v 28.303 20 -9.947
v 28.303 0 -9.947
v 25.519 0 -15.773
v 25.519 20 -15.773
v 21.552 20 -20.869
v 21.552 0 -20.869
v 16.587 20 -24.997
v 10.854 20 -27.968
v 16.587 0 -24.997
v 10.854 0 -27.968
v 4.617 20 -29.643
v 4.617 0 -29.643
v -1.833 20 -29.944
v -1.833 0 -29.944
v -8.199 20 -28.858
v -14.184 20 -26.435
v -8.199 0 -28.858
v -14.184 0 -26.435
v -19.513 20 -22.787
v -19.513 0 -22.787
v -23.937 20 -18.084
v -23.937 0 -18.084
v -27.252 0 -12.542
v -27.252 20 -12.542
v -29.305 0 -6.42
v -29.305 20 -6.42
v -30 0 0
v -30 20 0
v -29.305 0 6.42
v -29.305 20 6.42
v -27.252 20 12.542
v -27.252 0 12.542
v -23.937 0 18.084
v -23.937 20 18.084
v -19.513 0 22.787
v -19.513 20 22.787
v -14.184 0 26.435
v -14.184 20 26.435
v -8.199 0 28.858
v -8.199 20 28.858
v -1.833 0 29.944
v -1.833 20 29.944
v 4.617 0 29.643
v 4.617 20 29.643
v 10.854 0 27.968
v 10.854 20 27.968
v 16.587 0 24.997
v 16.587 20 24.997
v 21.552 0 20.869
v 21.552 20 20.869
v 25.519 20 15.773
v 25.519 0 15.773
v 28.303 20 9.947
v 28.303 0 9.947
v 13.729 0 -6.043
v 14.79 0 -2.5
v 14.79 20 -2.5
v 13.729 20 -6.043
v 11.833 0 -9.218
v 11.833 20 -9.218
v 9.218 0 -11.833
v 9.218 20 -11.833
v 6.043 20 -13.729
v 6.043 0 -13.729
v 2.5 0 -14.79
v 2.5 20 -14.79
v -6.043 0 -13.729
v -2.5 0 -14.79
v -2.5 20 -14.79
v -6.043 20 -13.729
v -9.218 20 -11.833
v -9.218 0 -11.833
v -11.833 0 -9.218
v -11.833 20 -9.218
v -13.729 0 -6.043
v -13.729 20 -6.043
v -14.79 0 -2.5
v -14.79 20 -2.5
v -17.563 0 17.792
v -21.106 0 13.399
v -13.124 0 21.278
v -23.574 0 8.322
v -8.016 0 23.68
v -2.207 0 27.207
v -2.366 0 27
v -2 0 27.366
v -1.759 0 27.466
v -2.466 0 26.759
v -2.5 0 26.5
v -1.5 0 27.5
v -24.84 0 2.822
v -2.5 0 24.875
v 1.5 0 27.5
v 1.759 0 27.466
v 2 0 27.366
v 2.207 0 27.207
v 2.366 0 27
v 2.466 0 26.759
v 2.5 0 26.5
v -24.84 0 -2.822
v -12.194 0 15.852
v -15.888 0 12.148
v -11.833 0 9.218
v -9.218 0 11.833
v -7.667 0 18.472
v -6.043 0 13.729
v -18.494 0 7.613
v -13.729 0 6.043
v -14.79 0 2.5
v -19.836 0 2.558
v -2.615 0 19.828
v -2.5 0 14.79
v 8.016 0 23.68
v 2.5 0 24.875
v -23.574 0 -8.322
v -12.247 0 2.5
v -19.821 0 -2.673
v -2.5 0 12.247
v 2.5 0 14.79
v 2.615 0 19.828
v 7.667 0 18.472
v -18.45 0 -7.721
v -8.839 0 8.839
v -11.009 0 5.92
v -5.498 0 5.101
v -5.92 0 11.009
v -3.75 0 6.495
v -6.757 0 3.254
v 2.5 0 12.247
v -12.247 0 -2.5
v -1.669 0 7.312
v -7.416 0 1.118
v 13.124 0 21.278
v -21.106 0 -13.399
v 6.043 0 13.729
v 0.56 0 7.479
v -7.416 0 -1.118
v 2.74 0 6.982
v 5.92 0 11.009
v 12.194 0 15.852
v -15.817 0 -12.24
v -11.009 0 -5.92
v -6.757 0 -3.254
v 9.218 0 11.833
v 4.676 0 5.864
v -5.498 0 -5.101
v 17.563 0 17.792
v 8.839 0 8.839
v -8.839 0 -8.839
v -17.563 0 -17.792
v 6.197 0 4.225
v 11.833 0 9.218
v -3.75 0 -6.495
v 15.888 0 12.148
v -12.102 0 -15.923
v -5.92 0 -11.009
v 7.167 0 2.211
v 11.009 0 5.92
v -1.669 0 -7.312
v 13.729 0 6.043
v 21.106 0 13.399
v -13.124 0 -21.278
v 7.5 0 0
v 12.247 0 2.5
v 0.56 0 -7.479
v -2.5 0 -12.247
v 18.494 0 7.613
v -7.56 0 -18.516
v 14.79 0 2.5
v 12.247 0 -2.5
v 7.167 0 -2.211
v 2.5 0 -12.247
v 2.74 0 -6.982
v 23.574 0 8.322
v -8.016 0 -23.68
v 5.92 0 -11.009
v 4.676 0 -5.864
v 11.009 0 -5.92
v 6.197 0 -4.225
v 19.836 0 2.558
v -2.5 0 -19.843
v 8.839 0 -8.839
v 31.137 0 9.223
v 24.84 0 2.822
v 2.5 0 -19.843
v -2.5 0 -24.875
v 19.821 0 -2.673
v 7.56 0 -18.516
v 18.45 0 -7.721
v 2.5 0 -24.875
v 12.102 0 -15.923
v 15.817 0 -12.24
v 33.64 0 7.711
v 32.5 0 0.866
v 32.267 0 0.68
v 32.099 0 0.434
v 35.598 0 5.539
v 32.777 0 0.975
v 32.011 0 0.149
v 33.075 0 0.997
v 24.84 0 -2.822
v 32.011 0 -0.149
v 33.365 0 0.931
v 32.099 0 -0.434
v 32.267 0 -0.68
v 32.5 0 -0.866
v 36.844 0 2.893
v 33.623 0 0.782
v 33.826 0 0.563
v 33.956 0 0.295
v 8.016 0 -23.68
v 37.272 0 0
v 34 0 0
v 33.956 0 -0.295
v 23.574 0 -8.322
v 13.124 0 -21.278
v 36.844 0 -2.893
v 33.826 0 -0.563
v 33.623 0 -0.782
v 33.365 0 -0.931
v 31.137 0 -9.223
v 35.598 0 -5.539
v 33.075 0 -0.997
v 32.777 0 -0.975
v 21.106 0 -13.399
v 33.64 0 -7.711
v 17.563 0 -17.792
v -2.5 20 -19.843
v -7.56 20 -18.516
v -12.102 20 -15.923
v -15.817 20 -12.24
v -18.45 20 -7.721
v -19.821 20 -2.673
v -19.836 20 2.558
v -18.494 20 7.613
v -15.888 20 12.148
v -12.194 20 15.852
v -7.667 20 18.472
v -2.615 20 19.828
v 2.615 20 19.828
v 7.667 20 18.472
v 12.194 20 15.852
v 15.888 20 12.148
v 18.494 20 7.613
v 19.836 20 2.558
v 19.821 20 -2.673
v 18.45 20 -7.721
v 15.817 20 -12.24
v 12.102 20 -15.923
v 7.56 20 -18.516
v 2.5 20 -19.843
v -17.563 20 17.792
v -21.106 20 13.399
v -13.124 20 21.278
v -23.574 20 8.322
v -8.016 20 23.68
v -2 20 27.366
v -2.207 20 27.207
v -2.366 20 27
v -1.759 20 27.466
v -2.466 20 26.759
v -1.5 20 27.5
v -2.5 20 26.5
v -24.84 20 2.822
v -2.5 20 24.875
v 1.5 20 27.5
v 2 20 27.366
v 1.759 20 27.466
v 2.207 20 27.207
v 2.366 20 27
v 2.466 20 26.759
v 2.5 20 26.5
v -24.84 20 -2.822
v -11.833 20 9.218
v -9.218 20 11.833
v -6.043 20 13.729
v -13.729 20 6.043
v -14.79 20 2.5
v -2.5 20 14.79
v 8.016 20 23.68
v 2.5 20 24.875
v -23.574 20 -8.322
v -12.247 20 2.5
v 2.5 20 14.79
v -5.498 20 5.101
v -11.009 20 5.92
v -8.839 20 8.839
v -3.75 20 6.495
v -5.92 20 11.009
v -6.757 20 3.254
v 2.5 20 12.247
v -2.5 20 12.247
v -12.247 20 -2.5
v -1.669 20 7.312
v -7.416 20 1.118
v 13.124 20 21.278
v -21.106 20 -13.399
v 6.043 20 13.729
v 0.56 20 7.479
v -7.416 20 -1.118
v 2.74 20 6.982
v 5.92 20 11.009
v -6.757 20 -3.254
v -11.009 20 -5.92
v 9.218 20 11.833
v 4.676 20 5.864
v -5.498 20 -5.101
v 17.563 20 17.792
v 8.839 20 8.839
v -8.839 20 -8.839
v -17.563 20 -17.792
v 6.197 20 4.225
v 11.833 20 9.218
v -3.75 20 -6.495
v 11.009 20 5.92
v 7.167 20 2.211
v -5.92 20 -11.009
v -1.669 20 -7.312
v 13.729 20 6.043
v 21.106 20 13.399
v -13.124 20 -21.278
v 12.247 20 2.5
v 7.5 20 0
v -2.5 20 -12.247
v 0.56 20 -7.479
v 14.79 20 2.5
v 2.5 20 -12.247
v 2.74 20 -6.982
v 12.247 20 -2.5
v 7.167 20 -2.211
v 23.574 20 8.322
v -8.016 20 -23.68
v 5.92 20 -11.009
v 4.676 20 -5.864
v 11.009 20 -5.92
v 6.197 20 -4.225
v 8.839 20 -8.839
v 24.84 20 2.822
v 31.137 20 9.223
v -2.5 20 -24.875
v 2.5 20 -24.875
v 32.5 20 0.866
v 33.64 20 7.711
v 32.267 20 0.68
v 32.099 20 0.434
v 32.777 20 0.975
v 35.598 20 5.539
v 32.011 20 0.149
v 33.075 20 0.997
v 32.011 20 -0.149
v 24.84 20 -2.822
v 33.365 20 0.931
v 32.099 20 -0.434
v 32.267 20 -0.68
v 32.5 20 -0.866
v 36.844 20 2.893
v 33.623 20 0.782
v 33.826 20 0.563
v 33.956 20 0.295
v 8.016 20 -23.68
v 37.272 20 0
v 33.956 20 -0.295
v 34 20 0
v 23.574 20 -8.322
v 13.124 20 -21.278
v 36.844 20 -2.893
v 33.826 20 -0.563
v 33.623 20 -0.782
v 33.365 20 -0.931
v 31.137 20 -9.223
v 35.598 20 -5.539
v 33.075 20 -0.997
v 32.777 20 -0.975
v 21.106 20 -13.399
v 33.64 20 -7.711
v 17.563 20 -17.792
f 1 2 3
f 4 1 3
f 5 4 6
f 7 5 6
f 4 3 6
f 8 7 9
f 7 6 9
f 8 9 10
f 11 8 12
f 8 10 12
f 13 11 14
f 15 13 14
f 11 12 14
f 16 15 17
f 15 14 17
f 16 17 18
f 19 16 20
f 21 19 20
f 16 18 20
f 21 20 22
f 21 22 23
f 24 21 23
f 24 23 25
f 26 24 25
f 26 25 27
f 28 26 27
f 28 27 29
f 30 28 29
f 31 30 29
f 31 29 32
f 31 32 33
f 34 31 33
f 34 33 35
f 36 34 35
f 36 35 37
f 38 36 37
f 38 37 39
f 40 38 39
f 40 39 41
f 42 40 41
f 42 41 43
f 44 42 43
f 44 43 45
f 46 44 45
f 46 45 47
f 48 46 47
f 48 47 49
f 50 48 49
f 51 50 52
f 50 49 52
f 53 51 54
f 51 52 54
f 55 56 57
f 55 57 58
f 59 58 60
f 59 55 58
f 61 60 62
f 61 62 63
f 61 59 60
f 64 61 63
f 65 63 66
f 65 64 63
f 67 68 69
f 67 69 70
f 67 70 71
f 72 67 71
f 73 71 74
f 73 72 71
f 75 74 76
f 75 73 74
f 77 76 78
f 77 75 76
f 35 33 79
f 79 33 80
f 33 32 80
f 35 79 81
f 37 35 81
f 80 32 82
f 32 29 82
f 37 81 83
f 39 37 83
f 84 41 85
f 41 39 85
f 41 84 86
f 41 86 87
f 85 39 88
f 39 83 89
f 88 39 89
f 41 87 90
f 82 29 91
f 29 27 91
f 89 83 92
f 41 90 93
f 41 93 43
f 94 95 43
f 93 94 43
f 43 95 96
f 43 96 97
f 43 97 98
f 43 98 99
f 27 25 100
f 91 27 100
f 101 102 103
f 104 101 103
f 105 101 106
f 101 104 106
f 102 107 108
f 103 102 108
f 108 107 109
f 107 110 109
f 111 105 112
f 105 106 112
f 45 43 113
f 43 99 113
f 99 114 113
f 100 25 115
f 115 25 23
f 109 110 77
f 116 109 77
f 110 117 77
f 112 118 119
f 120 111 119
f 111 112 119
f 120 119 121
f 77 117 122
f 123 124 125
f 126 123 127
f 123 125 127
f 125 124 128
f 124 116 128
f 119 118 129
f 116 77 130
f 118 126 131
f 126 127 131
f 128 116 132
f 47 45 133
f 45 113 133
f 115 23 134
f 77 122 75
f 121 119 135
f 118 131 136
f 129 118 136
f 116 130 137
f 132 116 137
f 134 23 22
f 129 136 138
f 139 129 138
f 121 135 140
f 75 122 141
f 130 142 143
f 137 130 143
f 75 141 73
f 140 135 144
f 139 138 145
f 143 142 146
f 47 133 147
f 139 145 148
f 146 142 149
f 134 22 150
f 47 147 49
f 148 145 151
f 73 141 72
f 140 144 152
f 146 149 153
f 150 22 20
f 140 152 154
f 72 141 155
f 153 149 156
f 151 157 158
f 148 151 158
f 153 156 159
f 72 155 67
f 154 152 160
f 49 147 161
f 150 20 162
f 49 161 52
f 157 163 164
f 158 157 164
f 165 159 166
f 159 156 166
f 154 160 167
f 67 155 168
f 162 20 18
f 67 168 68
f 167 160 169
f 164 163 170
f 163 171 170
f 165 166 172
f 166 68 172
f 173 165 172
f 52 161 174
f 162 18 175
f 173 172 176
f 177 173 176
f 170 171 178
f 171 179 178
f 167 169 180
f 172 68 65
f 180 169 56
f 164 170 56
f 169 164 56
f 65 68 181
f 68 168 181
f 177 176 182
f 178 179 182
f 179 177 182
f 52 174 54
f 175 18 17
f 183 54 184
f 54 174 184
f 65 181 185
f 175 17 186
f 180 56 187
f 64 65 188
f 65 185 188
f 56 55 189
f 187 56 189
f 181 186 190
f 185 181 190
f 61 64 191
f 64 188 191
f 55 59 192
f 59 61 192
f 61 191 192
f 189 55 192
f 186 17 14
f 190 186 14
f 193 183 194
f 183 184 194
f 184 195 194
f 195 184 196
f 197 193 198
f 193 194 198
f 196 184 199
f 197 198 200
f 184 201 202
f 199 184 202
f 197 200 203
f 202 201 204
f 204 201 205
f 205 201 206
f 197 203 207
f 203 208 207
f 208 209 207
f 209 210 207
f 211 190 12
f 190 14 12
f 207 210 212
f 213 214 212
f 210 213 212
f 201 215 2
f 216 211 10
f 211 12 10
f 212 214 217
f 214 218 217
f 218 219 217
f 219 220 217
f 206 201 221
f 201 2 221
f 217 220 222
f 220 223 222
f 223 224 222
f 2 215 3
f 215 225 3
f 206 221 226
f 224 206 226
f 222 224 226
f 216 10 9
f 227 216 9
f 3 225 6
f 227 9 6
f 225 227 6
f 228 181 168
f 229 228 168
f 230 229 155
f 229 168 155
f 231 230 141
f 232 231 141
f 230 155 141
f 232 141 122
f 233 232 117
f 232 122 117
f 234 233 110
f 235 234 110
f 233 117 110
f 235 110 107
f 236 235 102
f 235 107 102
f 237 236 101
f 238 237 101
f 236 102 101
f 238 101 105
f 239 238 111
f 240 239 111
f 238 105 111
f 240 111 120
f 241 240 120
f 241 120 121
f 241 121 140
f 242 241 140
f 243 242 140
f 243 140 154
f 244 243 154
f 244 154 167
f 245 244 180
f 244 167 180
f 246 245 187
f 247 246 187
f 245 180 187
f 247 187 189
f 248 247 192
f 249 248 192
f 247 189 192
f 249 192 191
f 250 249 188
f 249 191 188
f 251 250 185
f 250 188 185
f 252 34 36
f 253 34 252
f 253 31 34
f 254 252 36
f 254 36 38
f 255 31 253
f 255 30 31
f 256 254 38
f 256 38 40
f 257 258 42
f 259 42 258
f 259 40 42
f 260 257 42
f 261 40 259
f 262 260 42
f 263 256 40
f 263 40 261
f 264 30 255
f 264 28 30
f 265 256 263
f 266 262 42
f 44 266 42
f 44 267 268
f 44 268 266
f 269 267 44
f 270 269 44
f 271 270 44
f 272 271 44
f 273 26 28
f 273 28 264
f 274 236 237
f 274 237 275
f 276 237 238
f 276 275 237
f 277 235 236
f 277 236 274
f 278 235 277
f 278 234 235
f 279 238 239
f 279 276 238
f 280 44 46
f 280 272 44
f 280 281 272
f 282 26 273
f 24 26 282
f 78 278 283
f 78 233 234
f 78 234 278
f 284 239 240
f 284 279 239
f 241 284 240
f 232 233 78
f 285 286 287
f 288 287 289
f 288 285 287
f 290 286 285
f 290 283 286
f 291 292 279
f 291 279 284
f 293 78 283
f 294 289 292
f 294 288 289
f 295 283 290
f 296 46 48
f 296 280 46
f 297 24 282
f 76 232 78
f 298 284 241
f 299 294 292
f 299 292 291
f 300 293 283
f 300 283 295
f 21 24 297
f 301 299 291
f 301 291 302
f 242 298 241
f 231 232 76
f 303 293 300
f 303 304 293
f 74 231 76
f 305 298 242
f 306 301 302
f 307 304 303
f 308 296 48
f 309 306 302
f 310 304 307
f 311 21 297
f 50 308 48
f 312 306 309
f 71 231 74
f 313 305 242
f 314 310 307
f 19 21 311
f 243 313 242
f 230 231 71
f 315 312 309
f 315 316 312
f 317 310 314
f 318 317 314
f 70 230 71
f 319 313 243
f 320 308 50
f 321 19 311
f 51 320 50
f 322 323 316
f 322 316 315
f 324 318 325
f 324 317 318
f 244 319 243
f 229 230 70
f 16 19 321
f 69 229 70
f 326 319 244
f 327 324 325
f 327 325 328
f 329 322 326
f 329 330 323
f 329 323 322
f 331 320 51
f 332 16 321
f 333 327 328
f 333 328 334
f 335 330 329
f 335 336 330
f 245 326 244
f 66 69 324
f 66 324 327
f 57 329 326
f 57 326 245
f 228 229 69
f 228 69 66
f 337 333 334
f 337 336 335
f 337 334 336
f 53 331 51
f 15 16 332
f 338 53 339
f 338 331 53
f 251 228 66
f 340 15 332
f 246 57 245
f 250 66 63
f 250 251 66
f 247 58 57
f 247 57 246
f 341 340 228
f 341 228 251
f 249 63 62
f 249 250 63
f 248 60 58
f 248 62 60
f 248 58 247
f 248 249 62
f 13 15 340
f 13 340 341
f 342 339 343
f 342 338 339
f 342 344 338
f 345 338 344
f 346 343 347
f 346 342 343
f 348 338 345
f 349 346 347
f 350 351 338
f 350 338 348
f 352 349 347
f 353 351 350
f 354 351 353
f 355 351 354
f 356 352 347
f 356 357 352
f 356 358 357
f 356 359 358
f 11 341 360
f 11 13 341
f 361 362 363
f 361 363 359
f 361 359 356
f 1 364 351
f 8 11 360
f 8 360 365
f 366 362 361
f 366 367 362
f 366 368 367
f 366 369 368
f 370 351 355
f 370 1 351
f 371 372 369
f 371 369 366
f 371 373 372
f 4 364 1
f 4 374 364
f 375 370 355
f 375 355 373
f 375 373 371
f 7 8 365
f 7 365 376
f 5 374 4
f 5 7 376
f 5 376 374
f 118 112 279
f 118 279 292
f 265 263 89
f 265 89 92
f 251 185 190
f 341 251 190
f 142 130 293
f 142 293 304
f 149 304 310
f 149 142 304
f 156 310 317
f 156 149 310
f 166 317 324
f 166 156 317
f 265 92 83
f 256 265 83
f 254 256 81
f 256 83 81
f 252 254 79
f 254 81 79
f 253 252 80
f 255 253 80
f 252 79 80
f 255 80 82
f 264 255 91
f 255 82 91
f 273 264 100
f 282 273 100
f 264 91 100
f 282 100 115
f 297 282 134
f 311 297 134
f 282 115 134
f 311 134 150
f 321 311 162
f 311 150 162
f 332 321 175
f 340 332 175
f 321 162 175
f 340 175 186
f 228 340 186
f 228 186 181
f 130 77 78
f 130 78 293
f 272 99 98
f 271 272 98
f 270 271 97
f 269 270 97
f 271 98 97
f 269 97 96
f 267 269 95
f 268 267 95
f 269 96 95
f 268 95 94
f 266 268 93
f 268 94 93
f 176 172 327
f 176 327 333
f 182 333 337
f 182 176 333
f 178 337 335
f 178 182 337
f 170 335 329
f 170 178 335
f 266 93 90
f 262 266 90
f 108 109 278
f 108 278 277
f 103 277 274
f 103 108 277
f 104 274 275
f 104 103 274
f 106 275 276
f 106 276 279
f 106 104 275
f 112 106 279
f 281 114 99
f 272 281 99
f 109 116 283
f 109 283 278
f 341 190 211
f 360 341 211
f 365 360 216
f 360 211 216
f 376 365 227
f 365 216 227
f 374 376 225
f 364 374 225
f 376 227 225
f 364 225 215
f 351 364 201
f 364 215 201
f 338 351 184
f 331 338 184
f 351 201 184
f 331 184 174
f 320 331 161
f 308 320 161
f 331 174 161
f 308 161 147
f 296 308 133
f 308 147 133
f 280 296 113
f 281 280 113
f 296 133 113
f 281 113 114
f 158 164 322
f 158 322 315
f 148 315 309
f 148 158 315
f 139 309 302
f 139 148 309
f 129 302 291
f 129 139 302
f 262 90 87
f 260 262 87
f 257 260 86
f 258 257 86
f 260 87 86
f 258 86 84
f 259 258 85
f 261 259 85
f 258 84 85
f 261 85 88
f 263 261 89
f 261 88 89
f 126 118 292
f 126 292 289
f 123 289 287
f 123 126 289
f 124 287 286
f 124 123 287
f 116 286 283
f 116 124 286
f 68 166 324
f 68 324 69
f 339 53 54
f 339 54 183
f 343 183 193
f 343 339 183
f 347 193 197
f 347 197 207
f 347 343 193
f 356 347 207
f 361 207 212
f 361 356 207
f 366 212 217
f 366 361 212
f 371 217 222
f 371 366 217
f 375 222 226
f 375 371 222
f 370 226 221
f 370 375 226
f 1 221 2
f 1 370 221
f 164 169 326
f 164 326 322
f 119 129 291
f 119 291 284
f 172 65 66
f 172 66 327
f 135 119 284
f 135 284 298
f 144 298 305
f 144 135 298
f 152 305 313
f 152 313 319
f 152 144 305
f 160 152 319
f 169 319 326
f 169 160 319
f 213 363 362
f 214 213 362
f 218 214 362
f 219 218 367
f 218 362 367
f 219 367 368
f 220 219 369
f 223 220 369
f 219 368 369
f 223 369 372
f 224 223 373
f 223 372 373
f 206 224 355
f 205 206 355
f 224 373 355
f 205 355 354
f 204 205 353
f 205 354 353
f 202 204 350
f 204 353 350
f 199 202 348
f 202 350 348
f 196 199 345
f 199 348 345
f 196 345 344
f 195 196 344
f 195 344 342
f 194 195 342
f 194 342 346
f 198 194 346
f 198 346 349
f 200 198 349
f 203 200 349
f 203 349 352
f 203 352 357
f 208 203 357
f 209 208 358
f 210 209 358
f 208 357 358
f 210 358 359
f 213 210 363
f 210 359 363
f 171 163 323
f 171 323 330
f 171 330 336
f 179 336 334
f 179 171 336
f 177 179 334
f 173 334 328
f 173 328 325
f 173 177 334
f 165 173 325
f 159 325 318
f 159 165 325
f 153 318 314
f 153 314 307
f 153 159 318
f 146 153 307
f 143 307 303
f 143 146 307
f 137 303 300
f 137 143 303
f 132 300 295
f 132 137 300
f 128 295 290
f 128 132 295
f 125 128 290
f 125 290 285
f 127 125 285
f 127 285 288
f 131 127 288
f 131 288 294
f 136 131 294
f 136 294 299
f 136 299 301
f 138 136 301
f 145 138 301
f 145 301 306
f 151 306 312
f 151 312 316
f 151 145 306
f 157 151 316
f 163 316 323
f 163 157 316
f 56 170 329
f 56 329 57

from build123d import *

# Parameters (mm, degrees)
SKETCH1_R           = 30
SKETCH1_R_2         = 15
BOSS_EXTRUDE1_DEPTH = 20
BOSS_EXTRUDE2_DEPTH = 20
SKETCH3_R           = 1
CUT_EXTRUDE1_DEPTH  = 20
SKETCH4_R           = 7.5
BOSS_EXTRUDE3_DEPTH = 20


with BuildPart() as part:
    # Sketch1 → Boss-Extrude1 (new body)
    with BuildSketch(Plane(origin=(0, 0, 0), x_dir=(1, 0, 0), z_dir=(0, 1, 0))):
        Circle(SKETCH1_R)
        with BuildLine():
            ThreePointArc((-2.5, -24.874685928), (-25, 0), (-2.5, 24.874685928))
            Line((-2.5, 24.874685928), (-2.5, 19.843134833))
            ThreePointArc((-2.5, 19.843134833), (0, -20), (2.5, 19.843134833))
            Line((2.5, 19.843134833), (2.5, 24.874685928))
            ThreePointArc((2.5, 24.874685928), (25, 0), (2.5, -24.874685928))
            Line((2.5, -24.874685928), (2.5, -26.5))
            ThreePointArc((2.5, -26.5), (2.207106781, -27.207106781), (1.5, -27.5))
            Line((1.5, -27.5), (-1.5, -27.5))
            ThreePointArc((-1.5, -27.5), (-2.207106781, -27.207106781), (-2.5, -26.5))
            Line((-2.5, -26.5), (-2.5, -24.874685928))
        make_face(mode=Mode.SUBTRACT)
        Circle(SKETCH1_R_2, mode=Mode.SUBTRACT)
    extrude(amount=BOSS_EXTRUDE1_DEPTH)

    # Sketch2 → Boss-Extrude2 (add)
    with BuildSketch(Plane(origin=(0, 20, 0), x_dir=(1, 0, 0), z_dir=(0, 1, 0))):
        with BuildLine():
            Line((27.271780287, 10), (27.271780287, -10))
            ThreePointArc((27.271780287, -10), (37.271780287, 0), (27.271780287, 10))
        make_face()
    extrude(amount=-BOSS_EXTRUDE2_DEPTH)

    # Sketch3 → Cut-Extrude1 (cut)
    with BuildSketch(Plane(origin=(0, 20, 0), x_dir=(1, 0, 0), z_dir=(0, 1, 0))):
        with Locations((33, 0)):
            Circle(SKETCH3_R)
    extrude(amount=-CUT_EXTRUDE1_DEPTH, mode=Mode.SUBTRACT)

    # Sketch4 → Boss-Extrude3 (add)
    with BuildSketch(Plane(origin=(0, 0, 0), x_dir=(1, 0, 0), z_dir=(0, 1, 0))):
        with BuildLine():
            Line((-2.5, 19.843134833), (2.5, 19.843134833))
            Line((2.5, 19.843134833), (2.5, 12.247448714))
            ThreePointArc((2.5, 12.247448714), (8.838834765, 8.838834765), (12.247448714, 2.5))
            Line((12.247448714, 2.5), (16.124945742, 2.5))
            Line((16.124945742, 2.5), (16.124945742, -2.5))
            Line((16.124945742, -2.5), (12.247448714, -2.5))
            ThreePointArc((12.247448714, -2.5), (8.838834765, -8.838834765), (2.5, -12.247448714))
            Line((2.5, -12.247448714), (2.5, -17.575657714))
            Line((2.5, -17.575657714), (-2.5, -17.575657714))
            Line((-2.5, -17.575657714), (-2.5, -12.247448714))
            ThreePointArc((-2.5, -12.247448714), (-8.838834765, -8.838834765), (-12.247448714, -2.5))
            Line((-12.247448714, -2.5), (-16.958645249, -2.5))
            Line((-16.958645249, -2.5), (-16.958645249, 2.5))
            Line((-16.958645249, 2.5), (-12.247448714, 2.5))
            ThreePointArc((-12.247448714, 2.5), (-8.838834765, 8.838834765), (-2.5, 12.247448714))
            Line((-2.5, 12.247448714), (-2.5, 19.843134833))
        make_face()
        Circle(SKETCH4_R, mode=Mode.SUBTRACT)
    extrude(amount=BOSS_EXTRUDE3_DEPTH)


solid = part.part
